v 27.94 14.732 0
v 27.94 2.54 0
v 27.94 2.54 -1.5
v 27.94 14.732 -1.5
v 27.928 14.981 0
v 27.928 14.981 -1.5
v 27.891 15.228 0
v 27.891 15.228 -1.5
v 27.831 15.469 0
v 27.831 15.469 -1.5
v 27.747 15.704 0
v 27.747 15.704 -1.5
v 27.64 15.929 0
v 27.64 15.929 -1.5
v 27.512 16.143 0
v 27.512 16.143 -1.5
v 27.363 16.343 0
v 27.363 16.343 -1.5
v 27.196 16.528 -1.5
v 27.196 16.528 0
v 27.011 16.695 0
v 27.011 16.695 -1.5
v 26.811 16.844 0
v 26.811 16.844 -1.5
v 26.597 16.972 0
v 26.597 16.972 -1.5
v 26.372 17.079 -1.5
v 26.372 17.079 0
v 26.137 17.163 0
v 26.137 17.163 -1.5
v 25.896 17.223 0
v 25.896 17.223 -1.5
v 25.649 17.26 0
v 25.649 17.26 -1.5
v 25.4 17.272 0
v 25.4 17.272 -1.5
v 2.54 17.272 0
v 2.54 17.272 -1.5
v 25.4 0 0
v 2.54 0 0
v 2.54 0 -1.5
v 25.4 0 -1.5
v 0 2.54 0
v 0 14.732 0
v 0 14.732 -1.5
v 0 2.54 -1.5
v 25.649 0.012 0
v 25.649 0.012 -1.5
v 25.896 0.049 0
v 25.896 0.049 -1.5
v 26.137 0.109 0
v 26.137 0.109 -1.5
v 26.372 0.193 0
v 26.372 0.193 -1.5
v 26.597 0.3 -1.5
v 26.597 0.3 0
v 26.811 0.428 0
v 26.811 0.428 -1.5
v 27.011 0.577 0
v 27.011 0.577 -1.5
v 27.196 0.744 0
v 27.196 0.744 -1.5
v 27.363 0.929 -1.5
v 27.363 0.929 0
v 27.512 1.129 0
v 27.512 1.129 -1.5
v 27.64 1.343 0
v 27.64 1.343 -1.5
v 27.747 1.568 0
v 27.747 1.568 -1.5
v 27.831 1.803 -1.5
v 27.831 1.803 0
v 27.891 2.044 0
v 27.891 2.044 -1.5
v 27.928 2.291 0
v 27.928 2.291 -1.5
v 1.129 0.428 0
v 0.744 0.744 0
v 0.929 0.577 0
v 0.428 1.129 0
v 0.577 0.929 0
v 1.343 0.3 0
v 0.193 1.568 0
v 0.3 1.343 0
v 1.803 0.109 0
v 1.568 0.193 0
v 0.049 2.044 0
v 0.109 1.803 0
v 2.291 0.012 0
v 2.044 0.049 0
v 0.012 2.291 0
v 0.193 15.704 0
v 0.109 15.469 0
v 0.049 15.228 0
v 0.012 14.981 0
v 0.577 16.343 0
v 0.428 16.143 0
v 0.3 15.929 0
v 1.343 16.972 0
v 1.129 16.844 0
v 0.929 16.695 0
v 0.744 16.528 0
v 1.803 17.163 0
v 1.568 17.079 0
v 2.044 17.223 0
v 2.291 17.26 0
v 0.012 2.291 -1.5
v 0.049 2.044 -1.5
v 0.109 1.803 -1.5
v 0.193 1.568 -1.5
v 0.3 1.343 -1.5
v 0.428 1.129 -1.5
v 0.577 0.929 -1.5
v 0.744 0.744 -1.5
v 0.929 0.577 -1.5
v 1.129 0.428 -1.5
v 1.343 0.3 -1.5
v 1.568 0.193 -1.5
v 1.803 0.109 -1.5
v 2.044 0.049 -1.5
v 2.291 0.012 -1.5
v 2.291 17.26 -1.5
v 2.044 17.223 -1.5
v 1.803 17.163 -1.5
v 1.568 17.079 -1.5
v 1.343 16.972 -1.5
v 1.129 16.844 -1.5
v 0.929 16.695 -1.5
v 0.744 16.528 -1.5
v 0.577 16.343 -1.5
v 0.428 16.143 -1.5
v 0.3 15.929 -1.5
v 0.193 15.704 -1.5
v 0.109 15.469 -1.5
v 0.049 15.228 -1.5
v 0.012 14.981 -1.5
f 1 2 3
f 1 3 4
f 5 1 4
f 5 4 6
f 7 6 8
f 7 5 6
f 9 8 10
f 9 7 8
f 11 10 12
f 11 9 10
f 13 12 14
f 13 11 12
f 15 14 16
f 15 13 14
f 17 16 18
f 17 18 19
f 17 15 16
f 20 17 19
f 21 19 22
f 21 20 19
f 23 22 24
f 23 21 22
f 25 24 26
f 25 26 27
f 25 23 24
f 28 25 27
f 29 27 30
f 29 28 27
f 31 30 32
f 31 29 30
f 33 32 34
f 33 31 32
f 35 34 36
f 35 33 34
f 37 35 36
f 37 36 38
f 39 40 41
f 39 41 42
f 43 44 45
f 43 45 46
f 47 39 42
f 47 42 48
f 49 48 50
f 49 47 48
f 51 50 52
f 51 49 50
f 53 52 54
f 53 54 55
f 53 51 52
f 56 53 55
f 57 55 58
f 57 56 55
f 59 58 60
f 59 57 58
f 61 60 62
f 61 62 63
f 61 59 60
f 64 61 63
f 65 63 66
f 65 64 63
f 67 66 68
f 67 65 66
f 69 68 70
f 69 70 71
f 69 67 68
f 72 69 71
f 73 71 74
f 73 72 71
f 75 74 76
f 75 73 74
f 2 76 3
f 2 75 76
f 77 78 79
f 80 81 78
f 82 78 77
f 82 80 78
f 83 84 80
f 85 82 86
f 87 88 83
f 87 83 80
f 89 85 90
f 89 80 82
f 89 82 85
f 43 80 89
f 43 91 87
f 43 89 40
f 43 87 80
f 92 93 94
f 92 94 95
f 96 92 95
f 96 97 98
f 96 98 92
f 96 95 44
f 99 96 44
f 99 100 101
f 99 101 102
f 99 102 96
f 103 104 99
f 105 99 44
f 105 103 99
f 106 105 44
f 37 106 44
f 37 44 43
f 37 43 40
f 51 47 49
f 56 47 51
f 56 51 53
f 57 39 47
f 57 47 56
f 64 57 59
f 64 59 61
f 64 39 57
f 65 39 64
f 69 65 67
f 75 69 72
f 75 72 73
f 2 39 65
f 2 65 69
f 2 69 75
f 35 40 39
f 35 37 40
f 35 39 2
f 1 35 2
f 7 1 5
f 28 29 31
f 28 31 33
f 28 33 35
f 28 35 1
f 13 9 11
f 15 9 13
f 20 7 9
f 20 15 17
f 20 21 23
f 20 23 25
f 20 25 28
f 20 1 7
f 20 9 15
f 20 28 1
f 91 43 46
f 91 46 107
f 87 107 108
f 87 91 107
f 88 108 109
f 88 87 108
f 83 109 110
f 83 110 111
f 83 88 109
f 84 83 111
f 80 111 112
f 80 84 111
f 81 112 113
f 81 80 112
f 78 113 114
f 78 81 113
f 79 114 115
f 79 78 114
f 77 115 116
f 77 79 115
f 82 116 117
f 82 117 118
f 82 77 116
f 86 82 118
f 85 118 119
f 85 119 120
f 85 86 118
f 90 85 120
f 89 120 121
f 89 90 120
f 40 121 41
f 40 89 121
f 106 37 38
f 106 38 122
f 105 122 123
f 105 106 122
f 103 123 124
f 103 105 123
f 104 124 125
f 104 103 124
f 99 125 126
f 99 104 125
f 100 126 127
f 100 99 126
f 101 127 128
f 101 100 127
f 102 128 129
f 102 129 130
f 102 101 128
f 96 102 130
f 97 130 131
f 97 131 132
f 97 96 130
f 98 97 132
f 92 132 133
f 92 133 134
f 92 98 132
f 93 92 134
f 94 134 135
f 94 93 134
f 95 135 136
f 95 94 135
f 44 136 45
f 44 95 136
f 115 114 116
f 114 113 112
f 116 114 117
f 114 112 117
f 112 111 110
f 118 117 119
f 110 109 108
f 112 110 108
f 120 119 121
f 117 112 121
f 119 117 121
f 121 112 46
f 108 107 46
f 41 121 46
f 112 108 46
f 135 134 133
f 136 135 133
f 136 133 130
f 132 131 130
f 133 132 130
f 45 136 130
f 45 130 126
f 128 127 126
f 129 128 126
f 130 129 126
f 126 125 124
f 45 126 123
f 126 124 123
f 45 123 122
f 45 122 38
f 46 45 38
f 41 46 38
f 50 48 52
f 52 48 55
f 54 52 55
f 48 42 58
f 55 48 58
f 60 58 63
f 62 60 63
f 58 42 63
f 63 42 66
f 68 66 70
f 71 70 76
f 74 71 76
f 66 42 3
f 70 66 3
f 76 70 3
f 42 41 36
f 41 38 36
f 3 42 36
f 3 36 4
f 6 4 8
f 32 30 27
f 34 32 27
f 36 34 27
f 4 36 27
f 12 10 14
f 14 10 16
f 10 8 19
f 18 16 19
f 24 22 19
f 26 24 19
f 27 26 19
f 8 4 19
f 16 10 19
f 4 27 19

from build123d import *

# Parameters (mm, degrees)
SALIENTE_EXTRUIR1_DEPTH = 1.5


with BuildPart() as part:
    # Croquis2 → Saliente-Extruir1 (new body)
    with BuildSketch(Plane.XY):
        with BuildLine():
            Line((2.54, 0), (25.4, 0))
            ThreePointArc((25.4, 0), (27.196051224, 0.743948776), (27.94, 2.54))
            Line((27.94, 2.54), (27.94, 14.732))
            ThreePointArc((27.94, 14.732), (27.196051224, 16.528051224), (25.4, 17.272))
            Line((25.4, 17.272), (2.54, 17.272))
            ThreePointArc((2.54, 17.272), (0.743948776, 16.528051224), (0, 14.732))
            Line((0, 14.732), (0, 2.54))
            ThreePointArc((0, 2.54), (0.743948776, 0.743948776), (2.54, 0))
        make_face()
    extrude(amount=-SALIENTE_EXTRUIR1_DEPTH)


solid = part.part
